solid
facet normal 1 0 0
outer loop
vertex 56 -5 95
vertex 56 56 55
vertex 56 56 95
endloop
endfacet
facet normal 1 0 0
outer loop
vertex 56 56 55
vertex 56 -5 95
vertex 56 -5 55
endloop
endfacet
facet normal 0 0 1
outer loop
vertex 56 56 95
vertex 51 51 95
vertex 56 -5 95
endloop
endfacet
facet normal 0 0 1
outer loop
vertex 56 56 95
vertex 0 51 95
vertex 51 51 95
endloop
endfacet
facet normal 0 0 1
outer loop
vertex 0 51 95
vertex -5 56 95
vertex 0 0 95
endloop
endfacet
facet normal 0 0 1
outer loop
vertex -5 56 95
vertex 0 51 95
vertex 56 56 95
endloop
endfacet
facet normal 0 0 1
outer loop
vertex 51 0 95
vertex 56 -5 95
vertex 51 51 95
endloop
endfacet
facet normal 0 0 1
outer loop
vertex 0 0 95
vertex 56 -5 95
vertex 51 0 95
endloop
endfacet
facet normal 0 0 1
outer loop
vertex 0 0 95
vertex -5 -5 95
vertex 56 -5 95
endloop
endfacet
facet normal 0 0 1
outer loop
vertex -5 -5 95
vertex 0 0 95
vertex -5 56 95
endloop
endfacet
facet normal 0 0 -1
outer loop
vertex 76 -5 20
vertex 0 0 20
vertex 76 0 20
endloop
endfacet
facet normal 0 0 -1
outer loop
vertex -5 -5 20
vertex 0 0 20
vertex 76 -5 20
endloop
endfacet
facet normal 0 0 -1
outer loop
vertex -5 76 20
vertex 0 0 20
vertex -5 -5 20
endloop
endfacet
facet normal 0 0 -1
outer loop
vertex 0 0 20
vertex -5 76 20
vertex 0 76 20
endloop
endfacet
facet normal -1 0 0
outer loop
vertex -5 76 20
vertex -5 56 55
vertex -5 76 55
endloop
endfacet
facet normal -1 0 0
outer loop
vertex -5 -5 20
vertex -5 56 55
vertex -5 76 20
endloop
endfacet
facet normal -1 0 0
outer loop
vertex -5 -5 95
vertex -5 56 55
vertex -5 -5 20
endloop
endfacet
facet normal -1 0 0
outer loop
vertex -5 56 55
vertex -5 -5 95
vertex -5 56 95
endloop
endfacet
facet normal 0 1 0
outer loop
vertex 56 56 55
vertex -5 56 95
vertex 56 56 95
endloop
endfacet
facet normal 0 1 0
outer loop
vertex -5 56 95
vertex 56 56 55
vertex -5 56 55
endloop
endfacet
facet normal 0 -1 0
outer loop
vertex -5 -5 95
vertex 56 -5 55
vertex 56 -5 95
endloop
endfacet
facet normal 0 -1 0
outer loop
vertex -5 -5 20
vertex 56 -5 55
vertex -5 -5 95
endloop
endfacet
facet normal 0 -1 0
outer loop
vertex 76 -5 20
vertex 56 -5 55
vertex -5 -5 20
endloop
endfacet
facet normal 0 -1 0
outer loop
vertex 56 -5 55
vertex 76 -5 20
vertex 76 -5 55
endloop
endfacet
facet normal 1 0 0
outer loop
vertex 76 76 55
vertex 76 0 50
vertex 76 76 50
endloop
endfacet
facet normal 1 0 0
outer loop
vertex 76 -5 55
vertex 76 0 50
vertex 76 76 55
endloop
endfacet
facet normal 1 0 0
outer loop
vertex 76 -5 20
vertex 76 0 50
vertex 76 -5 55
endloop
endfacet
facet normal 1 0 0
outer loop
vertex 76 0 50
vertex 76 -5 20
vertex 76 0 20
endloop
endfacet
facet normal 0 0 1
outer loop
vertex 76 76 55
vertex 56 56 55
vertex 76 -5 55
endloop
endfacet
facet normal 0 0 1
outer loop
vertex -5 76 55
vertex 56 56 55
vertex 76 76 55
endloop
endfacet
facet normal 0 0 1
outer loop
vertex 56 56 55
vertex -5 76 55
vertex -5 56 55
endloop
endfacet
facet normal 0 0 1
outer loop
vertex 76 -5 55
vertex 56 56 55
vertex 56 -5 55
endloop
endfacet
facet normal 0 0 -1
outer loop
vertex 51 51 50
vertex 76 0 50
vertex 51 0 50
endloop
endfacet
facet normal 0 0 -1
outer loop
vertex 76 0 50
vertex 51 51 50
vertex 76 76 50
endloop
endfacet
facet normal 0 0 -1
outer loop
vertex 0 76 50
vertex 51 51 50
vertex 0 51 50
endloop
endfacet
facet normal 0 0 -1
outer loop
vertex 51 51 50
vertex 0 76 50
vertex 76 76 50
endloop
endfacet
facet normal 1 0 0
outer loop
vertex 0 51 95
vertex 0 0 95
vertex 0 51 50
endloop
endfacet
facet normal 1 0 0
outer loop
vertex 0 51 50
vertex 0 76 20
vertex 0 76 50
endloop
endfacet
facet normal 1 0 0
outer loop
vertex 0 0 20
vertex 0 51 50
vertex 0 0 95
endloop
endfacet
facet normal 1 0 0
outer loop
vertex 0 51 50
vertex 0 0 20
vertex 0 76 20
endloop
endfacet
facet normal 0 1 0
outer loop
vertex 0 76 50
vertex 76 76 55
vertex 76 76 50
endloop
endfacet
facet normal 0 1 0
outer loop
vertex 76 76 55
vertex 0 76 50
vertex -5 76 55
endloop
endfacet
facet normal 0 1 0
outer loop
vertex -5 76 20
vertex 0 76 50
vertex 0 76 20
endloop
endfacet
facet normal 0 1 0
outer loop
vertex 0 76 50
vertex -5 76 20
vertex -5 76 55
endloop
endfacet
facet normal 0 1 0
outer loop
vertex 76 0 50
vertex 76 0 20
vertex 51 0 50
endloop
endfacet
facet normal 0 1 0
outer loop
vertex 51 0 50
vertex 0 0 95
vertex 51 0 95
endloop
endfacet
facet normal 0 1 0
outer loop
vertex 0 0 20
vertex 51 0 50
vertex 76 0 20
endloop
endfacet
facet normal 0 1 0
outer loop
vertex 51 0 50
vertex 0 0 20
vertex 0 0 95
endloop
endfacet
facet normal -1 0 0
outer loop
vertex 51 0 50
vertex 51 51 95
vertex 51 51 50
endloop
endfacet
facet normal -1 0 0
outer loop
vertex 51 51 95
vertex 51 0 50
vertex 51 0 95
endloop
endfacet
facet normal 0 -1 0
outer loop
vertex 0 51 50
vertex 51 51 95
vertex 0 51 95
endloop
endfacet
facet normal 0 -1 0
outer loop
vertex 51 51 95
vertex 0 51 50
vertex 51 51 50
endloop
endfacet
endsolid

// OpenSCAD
base = 50 + 1;
thickness=5;

translate([0,0,50]) %cube([base,base,200]);
%cube([550,550,50]);

translate([0,0,20]) difference(){
  union() {
    translate([-thickness,-thickness,0]) cube([base+2*thickness,base+2*thickness,75]);
    translate([0,0,30]) cube([base+25,base+25,thickness]);
    translate([base,-thickness,0]) cube([25,thickness,30+thickness]);
    translate([-thickness,base,0]) cube([thickness,25,30+thickness]);
  }
  union() {
    translate([0,0,-.5*base]) cube([base,base,3*base]);
    translate([0,0,-1]) cube([4*base,4*base,31]);
  }
}
